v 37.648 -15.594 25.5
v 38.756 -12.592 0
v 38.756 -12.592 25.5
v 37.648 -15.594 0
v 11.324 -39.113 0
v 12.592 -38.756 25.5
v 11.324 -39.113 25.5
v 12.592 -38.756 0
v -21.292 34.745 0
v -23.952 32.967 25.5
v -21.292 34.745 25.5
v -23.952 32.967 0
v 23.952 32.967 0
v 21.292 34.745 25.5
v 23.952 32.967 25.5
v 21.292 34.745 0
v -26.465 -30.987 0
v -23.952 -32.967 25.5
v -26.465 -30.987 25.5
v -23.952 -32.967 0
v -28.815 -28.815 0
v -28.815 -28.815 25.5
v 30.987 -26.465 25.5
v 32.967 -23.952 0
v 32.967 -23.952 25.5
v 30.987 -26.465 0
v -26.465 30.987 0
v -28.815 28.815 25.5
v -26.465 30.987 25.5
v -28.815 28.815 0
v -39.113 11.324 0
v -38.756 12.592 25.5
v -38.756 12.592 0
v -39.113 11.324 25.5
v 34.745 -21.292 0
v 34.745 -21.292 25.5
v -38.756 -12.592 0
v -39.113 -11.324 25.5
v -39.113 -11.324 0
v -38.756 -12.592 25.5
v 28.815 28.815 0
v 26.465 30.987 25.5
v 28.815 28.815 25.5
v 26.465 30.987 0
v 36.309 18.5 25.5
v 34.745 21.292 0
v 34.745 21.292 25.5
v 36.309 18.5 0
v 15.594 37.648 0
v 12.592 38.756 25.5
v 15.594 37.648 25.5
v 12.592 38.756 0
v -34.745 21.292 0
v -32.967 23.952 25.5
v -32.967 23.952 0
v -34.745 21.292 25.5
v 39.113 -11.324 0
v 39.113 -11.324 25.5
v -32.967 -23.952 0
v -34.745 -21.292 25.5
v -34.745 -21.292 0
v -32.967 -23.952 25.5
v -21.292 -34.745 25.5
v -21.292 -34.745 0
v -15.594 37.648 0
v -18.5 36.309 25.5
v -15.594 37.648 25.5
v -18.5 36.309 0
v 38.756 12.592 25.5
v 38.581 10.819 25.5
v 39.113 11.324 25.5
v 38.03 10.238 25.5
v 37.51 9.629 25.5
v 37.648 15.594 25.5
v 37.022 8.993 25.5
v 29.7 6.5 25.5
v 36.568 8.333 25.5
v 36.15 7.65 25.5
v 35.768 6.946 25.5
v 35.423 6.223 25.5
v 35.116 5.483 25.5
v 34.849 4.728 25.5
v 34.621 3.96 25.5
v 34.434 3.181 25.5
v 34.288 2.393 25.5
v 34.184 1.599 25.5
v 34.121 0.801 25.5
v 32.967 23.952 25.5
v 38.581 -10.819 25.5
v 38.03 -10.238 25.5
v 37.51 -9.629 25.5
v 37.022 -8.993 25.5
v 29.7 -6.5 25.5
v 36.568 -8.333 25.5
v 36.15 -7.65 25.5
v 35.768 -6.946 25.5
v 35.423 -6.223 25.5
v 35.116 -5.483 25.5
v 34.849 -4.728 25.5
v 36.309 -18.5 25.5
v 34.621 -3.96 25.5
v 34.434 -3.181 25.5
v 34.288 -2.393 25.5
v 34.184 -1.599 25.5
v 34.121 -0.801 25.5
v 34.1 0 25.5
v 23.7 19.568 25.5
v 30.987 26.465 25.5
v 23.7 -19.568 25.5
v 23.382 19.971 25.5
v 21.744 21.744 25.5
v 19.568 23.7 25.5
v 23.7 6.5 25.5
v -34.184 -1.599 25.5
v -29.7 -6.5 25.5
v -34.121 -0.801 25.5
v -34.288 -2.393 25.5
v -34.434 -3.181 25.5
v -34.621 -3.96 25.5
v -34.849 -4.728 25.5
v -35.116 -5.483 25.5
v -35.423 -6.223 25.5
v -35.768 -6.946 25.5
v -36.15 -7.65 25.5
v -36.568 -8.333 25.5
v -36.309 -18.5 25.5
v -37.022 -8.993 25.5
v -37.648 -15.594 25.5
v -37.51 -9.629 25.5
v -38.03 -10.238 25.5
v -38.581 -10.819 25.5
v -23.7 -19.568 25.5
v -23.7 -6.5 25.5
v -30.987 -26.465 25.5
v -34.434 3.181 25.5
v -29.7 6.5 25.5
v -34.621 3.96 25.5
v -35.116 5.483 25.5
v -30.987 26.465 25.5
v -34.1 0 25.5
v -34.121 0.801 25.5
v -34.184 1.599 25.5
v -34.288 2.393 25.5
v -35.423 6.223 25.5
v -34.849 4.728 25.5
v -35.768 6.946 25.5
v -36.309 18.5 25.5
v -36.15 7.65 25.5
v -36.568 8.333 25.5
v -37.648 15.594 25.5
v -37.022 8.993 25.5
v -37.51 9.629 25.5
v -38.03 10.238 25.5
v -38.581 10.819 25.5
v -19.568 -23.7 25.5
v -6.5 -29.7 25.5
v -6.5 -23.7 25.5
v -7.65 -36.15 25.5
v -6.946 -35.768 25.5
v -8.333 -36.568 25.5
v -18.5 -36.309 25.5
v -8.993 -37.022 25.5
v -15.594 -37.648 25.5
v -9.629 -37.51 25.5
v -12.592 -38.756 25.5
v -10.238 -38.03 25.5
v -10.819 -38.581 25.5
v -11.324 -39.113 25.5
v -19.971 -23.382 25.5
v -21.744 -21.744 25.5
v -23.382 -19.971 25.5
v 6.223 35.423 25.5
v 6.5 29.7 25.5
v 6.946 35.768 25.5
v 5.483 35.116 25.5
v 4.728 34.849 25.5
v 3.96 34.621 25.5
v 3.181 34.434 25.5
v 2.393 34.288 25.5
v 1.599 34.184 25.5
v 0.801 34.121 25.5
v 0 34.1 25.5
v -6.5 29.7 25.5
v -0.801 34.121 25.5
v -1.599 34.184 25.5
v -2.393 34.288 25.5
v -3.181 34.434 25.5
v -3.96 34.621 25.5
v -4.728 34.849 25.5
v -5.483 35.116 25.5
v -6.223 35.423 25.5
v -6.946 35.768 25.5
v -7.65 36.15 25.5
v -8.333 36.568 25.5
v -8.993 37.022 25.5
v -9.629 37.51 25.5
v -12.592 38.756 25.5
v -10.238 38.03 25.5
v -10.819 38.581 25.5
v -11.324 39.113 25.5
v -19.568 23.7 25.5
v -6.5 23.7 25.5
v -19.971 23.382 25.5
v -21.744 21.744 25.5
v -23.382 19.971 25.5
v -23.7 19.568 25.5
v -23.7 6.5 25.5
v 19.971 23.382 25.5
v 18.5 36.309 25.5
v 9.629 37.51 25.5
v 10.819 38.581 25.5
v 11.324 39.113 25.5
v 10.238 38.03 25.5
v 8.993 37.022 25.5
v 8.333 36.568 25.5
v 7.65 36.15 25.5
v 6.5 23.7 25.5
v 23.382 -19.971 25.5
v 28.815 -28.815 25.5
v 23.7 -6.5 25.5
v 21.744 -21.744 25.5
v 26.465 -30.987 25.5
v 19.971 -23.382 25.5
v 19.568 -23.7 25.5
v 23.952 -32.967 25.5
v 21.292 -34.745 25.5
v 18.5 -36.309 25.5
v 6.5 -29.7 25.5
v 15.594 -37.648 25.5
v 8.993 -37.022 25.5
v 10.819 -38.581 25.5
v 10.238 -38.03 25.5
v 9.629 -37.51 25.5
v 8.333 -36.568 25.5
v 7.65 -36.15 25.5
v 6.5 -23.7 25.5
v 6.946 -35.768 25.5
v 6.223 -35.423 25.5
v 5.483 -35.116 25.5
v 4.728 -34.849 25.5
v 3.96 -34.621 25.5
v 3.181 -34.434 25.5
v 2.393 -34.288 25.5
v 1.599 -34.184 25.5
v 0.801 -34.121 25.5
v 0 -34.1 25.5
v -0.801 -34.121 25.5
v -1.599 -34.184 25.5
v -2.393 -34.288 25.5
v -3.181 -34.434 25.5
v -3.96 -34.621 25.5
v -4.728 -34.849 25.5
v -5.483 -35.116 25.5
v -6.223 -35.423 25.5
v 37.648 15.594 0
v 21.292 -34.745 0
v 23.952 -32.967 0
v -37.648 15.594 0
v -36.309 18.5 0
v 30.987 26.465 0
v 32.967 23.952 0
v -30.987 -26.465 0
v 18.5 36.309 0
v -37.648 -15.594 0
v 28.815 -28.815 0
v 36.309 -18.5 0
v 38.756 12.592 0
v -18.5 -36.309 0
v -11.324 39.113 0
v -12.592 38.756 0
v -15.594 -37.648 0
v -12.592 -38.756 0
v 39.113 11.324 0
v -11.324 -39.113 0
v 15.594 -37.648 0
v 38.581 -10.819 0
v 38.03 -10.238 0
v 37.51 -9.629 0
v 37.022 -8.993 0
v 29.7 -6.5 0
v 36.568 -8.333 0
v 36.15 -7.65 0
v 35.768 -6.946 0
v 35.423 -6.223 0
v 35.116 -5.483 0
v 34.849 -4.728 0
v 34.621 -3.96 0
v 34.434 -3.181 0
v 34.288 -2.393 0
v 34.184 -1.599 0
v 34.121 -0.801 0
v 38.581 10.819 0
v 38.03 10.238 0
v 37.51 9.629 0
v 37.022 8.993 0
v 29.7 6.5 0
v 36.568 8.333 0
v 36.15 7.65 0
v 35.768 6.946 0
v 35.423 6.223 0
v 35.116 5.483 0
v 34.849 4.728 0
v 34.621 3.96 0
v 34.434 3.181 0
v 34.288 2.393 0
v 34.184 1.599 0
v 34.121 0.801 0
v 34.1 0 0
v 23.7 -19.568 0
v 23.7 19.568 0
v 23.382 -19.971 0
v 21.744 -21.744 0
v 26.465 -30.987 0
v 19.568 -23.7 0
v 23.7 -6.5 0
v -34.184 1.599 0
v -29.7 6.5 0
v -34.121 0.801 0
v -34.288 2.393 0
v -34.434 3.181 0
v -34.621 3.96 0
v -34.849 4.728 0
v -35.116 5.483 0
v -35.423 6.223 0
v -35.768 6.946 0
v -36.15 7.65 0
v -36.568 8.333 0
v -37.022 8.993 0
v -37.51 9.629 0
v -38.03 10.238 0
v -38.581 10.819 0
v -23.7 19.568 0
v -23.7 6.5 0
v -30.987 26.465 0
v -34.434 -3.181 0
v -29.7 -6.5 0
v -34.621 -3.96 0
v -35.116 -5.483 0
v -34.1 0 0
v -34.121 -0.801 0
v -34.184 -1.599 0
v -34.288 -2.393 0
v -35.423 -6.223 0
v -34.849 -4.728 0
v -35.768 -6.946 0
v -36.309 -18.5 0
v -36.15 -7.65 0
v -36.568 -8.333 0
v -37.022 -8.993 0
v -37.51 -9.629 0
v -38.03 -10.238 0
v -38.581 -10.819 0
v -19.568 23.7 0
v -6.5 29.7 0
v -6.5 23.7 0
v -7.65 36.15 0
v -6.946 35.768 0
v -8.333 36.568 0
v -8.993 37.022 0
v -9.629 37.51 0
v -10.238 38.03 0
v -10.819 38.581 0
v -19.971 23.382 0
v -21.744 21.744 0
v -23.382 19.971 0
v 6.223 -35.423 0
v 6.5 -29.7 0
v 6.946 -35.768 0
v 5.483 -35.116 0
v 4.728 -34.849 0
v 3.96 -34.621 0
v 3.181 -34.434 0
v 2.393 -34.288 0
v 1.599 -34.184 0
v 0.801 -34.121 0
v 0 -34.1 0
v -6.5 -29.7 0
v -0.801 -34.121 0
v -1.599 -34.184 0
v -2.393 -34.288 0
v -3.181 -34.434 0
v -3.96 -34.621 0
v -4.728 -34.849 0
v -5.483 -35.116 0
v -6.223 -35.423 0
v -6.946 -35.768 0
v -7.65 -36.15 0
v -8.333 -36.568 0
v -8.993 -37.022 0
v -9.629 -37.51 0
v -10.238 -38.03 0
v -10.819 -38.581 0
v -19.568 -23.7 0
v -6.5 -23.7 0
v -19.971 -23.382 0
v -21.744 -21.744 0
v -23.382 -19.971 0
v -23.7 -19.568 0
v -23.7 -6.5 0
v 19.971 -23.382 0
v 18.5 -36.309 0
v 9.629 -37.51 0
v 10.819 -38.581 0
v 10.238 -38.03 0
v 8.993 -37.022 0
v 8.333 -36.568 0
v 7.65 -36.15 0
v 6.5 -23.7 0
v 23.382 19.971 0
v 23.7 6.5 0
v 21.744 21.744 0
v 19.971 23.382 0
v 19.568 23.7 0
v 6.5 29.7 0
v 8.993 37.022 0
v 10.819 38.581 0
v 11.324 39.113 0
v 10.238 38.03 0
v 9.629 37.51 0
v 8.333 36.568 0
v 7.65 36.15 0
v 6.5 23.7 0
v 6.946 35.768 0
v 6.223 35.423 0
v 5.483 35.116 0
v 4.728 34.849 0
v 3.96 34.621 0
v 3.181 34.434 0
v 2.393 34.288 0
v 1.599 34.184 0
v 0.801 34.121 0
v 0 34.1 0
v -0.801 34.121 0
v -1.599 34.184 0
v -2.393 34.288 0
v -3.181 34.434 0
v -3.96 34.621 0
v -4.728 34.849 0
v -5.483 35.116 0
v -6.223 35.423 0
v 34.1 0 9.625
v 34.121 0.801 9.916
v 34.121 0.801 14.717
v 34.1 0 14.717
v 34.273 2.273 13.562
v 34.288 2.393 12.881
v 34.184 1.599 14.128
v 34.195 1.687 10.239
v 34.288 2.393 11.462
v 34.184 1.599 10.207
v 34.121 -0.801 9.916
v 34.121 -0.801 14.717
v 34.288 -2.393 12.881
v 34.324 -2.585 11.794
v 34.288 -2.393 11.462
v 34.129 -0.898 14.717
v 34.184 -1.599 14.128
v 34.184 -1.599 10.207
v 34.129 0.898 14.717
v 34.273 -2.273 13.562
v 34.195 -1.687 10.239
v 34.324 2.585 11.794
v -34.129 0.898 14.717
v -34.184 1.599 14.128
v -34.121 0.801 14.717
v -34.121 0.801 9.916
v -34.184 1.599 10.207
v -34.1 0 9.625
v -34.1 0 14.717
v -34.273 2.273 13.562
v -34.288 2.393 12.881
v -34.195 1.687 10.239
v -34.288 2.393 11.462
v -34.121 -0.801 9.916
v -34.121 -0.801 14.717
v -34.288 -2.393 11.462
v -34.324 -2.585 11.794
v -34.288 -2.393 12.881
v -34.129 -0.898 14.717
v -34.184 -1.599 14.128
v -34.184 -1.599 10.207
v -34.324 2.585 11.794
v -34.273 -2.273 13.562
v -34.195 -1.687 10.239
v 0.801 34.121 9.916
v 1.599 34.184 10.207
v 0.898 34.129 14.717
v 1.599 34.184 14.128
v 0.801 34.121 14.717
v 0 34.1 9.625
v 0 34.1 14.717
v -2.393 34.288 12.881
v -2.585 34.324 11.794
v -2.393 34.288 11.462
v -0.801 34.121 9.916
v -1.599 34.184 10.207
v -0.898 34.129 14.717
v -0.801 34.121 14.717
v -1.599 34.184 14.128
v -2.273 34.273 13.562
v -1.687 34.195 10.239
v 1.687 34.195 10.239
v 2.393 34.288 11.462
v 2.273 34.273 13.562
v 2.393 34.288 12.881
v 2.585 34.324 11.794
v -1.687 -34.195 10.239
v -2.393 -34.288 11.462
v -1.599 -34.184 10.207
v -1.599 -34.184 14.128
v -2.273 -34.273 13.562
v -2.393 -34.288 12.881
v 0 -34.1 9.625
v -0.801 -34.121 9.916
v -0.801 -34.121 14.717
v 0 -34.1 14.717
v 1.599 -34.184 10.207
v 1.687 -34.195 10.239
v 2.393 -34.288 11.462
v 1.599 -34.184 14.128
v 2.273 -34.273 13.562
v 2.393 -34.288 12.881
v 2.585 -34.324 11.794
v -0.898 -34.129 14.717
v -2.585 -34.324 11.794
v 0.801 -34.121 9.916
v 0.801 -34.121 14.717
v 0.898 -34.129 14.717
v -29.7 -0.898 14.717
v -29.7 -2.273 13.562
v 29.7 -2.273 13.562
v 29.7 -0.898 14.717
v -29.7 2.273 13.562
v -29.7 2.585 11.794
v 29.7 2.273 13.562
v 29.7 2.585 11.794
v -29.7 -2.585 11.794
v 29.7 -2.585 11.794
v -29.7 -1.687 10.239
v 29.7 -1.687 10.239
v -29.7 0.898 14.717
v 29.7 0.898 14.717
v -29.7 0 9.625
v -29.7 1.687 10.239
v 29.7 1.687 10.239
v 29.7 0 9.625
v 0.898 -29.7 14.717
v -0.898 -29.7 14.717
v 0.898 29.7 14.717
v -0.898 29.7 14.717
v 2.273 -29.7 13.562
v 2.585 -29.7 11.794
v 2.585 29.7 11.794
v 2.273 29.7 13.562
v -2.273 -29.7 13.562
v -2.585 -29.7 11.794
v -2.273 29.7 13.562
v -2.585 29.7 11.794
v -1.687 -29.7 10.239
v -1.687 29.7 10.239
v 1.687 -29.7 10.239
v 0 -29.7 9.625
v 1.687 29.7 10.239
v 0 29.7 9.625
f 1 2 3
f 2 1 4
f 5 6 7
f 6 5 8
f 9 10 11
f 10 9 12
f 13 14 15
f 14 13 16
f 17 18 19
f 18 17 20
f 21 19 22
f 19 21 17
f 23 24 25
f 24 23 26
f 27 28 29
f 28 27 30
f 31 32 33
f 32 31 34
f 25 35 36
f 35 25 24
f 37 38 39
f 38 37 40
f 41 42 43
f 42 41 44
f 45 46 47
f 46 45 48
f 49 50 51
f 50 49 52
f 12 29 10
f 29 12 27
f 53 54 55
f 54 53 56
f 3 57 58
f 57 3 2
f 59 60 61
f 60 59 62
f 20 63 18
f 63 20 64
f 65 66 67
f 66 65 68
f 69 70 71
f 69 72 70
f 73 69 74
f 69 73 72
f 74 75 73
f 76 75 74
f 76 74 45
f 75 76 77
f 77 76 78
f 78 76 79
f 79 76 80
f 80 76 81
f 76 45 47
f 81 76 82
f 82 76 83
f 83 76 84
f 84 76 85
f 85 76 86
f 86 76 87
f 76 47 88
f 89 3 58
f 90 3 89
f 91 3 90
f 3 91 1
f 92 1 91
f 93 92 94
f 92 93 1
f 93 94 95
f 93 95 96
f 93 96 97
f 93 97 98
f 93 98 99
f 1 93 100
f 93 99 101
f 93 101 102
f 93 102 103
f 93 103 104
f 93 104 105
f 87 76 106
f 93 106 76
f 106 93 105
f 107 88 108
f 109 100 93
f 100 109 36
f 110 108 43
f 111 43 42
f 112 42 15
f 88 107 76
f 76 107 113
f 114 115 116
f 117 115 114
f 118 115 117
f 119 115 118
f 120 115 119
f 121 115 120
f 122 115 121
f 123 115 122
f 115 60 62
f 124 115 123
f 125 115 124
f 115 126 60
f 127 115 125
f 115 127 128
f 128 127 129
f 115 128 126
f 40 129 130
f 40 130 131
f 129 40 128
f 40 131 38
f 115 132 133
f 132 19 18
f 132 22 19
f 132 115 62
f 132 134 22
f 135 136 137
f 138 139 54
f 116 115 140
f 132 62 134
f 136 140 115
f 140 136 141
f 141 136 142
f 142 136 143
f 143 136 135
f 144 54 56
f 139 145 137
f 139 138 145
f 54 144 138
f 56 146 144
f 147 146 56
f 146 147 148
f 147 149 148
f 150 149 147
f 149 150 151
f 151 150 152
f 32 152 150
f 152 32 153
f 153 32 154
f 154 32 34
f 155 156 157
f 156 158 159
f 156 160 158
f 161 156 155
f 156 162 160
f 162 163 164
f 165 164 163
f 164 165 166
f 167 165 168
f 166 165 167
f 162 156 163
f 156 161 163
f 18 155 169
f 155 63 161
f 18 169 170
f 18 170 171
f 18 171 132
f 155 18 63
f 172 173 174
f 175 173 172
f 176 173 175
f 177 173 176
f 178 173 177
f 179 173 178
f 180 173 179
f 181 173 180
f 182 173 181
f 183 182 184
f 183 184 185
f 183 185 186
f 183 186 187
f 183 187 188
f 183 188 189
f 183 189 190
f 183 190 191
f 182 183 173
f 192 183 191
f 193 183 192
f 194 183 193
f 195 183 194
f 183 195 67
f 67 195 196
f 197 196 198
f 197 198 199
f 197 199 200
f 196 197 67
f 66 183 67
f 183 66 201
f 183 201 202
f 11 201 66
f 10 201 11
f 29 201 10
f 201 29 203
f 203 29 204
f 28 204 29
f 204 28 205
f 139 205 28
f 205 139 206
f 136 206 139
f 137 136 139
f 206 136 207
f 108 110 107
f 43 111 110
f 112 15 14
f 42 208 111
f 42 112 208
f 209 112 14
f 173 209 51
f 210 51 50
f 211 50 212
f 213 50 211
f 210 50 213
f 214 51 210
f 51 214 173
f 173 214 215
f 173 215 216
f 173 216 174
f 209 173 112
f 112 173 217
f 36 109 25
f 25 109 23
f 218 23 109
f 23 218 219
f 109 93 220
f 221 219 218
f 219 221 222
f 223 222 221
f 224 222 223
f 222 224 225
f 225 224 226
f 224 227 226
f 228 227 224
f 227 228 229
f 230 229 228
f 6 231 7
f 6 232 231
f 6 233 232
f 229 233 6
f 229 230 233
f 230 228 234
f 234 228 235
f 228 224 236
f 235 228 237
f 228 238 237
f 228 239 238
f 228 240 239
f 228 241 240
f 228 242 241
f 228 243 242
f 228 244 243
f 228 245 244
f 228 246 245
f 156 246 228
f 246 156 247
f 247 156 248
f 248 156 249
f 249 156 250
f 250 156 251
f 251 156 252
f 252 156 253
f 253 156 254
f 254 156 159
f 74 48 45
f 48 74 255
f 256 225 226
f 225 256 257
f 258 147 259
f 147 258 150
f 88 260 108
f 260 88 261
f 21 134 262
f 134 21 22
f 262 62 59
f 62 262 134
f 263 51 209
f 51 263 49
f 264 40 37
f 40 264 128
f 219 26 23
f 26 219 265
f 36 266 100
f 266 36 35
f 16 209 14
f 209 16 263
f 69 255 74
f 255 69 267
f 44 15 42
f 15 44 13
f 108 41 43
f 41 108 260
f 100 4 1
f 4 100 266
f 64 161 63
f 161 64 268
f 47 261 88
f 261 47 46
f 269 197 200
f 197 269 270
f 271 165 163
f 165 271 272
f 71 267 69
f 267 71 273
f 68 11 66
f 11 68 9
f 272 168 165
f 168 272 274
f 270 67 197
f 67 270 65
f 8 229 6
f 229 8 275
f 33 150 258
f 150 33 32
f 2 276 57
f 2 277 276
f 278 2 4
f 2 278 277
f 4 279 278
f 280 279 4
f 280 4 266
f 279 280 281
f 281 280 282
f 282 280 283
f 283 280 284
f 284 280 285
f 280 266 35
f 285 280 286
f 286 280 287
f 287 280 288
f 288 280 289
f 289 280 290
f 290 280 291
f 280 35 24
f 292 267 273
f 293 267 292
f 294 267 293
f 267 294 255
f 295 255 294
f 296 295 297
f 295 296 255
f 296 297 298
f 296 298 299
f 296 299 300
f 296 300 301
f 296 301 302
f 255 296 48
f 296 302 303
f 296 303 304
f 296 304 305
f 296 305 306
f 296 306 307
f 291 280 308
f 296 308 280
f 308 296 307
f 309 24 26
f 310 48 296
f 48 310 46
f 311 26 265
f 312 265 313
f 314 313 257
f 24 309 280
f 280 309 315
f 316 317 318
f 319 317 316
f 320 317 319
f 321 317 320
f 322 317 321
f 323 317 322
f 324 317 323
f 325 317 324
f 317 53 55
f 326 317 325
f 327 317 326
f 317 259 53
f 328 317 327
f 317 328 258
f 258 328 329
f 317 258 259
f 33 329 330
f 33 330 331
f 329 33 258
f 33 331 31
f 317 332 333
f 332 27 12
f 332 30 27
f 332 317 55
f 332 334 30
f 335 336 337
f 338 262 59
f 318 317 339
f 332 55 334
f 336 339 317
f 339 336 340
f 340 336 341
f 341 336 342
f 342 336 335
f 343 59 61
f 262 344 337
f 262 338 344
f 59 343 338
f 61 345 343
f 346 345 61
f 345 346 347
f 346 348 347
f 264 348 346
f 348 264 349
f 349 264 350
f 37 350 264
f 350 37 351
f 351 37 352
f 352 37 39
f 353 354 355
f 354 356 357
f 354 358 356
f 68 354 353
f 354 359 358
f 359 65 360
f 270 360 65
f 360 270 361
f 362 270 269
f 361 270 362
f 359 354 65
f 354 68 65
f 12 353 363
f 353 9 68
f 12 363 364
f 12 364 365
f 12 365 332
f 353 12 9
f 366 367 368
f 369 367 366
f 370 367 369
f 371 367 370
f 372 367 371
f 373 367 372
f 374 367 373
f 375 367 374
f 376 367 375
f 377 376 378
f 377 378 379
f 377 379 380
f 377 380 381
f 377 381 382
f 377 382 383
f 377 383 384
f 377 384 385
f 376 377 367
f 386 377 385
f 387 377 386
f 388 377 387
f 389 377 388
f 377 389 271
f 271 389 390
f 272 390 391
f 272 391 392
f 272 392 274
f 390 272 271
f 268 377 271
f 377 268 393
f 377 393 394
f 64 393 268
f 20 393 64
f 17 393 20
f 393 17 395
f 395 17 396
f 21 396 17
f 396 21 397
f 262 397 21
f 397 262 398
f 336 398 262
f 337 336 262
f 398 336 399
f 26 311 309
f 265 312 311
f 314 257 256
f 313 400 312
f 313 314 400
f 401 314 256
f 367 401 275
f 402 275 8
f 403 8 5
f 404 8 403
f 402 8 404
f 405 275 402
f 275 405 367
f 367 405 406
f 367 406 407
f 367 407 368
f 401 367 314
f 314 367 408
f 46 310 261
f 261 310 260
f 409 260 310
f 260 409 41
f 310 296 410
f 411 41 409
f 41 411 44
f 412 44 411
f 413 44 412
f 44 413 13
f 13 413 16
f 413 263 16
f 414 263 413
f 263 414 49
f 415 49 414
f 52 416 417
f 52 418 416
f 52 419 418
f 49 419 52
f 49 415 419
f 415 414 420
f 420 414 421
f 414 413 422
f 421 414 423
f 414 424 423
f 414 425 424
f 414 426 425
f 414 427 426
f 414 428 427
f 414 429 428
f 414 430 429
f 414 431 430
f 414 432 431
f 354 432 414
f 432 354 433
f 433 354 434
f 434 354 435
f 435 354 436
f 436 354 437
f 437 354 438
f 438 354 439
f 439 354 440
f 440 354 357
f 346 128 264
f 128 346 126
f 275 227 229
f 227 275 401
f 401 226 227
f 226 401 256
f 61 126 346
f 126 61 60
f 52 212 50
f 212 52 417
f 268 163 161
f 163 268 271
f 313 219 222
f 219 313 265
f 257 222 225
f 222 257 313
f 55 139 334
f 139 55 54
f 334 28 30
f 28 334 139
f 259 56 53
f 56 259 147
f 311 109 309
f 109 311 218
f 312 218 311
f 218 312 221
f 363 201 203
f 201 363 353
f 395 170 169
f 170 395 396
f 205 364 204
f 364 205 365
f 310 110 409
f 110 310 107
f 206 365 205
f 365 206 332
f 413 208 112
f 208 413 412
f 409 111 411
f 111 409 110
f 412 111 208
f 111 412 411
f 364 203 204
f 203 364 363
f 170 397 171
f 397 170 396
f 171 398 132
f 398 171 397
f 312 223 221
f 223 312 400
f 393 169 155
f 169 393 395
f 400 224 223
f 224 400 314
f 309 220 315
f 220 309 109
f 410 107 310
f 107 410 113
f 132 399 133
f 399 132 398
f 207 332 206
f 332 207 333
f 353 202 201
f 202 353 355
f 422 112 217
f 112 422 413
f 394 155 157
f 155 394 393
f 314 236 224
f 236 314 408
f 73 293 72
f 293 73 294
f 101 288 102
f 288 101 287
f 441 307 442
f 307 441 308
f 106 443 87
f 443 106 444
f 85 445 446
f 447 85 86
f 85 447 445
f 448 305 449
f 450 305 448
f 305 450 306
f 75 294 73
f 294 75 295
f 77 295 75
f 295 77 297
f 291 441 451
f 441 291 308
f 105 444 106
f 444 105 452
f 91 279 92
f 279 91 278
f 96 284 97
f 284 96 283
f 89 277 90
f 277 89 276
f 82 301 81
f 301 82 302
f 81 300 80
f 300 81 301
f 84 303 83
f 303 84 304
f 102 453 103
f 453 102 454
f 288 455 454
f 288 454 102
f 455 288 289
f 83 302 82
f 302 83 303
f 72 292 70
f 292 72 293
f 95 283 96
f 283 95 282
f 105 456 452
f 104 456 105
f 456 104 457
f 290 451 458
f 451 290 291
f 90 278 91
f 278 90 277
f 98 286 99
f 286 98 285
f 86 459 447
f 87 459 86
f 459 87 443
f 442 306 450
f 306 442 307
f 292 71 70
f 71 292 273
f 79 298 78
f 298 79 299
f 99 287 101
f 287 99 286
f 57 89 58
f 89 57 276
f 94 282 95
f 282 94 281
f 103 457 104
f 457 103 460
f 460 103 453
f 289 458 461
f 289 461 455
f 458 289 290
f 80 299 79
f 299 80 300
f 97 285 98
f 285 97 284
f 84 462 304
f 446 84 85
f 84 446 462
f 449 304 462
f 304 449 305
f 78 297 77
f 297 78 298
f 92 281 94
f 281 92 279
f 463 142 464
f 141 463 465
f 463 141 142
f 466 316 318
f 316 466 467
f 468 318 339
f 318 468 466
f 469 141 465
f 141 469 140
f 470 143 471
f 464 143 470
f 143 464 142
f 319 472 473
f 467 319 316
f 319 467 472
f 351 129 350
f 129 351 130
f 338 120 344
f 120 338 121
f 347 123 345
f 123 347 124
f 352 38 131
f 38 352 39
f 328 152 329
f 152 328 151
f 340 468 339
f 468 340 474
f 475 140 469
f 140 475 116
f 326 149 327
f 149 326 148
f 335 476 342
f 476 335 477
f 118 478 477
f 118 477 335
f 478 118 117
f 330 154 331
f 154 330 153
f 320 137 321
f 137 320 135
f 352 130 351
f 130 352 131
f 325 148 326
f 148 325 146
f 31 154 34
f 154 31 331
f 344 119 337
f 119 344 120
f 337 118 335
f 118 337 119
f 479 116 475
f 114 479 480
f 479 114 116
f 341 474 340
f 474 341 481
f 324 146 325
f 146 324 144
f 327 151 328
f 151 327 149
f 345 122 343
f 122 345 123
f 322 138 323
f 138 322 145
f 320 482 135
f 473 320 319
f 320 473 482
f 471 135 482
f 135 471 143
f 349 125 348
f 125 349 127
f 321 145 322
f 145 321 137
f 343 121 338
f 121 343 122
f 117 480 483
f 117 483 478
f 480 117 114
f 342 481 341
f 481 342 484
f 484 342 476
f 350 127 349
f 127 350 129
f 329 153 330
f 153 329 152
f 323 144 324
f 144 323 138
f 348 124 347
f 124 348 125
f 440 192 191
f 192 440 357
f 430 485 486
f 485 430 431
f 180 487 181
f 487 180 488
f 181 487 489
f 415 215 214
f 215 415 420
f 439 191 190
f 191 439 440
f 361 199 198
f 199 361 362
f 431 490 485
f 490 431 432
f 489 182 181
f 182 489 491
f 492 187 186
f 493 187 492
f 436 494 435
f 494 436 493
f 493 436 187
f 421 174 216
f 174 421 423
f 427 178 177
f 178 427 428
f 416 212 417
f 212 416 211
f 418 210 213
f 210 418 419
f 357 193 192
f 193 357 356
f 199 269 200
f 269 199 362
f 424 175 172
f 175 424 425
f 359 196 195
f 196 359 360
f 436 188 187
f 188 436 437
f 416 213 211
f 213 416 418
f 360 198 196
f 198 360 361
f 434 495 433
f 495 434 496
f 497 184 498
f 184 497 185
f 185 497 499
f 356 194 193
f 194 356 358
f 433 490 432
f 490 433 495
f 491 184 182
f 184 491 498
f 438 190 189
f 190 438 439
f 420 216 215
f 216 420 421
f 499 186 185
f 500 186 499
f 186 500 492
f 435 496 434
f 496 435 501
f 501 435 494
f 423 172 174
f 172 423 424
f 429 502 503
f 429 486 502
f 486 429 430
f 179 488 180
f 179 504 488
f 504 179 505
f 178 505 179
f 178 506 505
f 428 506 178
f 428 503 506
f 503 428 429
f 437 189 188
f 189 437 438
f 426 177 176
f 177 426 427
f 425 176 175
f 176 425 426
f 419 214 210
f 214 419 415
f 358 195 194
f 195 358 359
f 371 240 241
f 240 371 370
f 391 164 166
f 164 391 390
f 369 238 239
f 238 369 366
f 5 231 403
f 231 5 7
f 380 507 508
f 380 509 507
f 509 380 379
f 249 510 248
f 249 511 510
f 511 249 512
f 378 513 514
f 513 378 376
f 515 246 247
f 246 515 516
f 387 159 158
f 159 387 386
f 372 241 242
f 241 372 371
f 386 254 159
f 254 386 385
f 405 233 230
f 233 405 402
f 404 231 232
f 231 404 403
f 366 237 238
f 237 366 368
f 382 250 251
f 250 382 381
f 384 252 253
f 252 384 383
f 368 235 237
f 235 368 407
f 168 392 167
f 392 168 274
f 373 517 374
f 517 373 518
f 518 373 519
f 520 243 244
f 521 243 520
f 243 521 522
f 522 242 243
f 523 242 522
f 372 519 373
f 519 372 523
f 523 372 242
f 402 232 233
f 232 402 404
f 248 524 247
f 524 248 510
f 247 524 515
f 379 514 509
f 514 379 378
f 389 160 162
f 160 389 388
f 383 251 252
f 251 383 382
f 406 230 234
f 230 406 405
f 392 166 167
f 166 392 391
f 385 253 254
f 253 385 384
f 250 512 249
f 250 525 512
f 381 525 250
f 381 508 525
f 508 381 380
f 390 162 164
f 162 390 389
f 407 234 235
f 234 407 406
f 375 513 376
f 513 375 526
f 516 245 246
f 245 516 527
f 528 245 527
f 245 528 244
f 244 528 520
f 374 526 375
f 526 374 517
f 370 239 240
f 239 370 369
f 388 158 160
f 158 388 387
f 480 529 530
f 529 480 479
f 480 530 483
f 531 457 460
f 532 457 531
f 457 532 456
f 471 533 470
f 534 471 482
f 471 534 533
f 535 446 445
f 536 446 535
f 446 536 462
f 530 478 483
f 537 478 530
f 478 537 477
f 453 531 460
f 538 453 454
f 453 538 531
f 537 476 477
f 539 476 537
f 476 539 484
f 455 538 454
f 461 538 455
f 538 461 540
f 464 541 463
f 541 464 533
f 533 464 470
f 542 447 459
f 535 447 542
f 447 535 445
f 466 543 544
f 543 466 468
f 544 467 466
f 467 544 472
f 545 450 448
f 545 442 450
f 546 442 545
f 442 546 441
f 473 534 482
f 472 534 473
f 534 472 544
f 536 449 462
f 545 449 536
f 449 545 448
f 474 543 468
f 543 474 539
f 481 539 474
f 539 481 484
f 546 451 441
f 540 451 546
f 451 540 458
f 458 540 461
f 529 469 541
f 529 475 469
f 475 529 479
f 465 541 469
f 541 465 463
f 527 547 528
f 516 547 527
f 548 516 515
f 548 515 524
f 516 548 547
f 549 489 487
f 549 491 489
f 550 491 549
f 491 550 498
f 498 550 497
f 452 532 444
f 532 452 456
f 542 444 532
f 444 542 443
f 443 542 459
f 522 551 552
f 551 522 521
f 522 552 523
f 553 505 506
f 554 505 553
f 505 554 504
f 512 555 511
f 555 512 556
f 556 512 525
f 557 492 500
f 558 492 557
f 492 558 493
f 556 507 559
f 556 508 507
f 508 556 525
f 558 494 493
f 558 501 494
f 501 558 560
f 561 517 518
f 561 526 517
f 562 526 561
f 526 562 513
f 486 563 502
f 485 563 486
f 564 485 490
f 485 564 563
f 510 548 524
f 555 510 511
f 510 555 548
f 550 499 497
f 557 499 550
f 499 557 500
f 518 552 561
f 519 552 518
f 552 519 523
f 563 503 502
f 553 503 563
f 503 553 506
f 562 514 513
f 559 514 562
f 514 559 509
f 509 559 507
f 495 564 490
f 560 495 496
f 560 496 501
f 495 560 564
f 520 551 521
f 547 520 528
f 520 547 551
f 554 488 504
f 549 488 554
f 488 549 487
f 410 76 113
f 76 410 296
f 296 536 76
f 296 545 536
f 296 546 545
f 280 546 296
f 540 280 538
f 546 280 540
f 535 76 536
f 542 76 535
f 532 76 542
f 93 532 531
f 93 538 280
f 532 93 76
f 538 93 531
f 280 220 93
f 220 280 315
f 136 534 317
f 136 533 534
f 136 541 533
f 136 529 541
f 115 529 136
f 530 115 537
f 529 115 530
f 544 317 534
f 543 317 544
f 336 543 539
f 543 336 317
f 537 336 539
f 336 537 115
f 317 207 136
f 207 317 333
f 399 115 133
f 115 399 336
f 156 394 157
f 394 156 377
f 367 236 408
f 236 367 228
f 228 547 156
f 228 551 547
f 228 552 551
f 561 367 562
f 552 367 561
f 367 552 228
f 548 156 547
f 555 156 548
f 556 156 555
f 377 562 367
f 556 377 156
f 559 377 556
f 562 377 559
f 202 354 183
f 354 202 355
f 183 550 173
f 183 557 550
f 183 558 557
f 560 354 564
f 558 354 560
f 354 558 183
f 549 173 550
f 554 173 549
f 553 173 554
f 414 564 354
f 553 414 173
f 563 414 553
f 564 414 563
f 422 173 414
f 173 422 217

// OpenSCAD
//Measured distances:
//78 mm - Dimension from outermost point to outermost point. (squared up) 
//69.2 mm - Dimension from inside most outer edge point to inside most outer edge point on other side.
//63.5 mm - Dimension on outermost inside edge to outermost inside edge on other side.
//12.5 mm - rough width of shell
//6.5mm - dimension from outermost part to inside wall.
//75mm outer shell diameter

//82.5 outer most edge to outer most edge diameter

//nut edges are 10.9 towards inside, flaring to 11.1 towards shell.

module mainShell(outerd,shellwidth,height,fn=80){
difference(){
    cylinder(r1=outerd/2.,r2=outerd/2.,h=height,$fn=fn);
    translate([0,0,-0.1])
    cylinder(r1=(outerd-shellwidth)/2.,r2=(outerd-shellwidth)/2.,h=height+0.2,$fn=fn);
}
}

difference(){
    union(){
        mainShell(81.5,20,25.5);
        translate([23.7,-22,0]) linear_extrude(25.5) square([8,44]);
        translate([-23.7-8,-22,0]) linear_extrude(25.5) square([8,44]);
        translate([-22,23.7,0]) linear_extrude(25.5) square([44,8]);
        translate([-22,-23.7-8,0]) linear_extrude(25.5) square([44,8]);
    }
    union(){
        translate([49.4,0,-0.1]) cylinder(r1=30.6/2,r2=30.6/2,h=25.5+0.2,$fn=120);
        translate([-49.4,0,-0.1]) cylinder(r1=30.6/2,r2=30.6/2,h=25.5+0.2,$fn=120);
        translate([0,49.4,-0.1]) cylinder(r1=30.6/2,r2=30.6/2,h=25.5+0.2,$fn=120);
        translate([0,-49.4,-0.1]) cylinder(r1=30.6/2,r2=30.6/2,h=25.5+0.2,$fn=120);
        translate([-50,0,12.25]) rotate([0,90,0]) cylinder(r1=5.25/2,r2=5.25/2,h=100);
        translate([0,0,12.25]) rotate([90,90,0]) cylinder(r1=5.25/2.,r2=5.25/2.,h=100,center=true);
        translate([18.7,-6.5,-0.1]) linear_extrude(25.7) square([11,13]);
        translate([-18.7-5.5*2,-6.5,-0.1]) linear_extrude(25.7) square([11,13]);        
        translate([-6.5,-18.7-5.5*2,-0.1]) linear_extrude(25.7) square([13,11]);
        translate([-6.5,18.7,-0.1]) linear_extrude(25.7) square([13,11]);
    }
}
    
//28.6 - Dimension of legs at screw hole
//30.6 - Dimension of legs above/below screw hole
